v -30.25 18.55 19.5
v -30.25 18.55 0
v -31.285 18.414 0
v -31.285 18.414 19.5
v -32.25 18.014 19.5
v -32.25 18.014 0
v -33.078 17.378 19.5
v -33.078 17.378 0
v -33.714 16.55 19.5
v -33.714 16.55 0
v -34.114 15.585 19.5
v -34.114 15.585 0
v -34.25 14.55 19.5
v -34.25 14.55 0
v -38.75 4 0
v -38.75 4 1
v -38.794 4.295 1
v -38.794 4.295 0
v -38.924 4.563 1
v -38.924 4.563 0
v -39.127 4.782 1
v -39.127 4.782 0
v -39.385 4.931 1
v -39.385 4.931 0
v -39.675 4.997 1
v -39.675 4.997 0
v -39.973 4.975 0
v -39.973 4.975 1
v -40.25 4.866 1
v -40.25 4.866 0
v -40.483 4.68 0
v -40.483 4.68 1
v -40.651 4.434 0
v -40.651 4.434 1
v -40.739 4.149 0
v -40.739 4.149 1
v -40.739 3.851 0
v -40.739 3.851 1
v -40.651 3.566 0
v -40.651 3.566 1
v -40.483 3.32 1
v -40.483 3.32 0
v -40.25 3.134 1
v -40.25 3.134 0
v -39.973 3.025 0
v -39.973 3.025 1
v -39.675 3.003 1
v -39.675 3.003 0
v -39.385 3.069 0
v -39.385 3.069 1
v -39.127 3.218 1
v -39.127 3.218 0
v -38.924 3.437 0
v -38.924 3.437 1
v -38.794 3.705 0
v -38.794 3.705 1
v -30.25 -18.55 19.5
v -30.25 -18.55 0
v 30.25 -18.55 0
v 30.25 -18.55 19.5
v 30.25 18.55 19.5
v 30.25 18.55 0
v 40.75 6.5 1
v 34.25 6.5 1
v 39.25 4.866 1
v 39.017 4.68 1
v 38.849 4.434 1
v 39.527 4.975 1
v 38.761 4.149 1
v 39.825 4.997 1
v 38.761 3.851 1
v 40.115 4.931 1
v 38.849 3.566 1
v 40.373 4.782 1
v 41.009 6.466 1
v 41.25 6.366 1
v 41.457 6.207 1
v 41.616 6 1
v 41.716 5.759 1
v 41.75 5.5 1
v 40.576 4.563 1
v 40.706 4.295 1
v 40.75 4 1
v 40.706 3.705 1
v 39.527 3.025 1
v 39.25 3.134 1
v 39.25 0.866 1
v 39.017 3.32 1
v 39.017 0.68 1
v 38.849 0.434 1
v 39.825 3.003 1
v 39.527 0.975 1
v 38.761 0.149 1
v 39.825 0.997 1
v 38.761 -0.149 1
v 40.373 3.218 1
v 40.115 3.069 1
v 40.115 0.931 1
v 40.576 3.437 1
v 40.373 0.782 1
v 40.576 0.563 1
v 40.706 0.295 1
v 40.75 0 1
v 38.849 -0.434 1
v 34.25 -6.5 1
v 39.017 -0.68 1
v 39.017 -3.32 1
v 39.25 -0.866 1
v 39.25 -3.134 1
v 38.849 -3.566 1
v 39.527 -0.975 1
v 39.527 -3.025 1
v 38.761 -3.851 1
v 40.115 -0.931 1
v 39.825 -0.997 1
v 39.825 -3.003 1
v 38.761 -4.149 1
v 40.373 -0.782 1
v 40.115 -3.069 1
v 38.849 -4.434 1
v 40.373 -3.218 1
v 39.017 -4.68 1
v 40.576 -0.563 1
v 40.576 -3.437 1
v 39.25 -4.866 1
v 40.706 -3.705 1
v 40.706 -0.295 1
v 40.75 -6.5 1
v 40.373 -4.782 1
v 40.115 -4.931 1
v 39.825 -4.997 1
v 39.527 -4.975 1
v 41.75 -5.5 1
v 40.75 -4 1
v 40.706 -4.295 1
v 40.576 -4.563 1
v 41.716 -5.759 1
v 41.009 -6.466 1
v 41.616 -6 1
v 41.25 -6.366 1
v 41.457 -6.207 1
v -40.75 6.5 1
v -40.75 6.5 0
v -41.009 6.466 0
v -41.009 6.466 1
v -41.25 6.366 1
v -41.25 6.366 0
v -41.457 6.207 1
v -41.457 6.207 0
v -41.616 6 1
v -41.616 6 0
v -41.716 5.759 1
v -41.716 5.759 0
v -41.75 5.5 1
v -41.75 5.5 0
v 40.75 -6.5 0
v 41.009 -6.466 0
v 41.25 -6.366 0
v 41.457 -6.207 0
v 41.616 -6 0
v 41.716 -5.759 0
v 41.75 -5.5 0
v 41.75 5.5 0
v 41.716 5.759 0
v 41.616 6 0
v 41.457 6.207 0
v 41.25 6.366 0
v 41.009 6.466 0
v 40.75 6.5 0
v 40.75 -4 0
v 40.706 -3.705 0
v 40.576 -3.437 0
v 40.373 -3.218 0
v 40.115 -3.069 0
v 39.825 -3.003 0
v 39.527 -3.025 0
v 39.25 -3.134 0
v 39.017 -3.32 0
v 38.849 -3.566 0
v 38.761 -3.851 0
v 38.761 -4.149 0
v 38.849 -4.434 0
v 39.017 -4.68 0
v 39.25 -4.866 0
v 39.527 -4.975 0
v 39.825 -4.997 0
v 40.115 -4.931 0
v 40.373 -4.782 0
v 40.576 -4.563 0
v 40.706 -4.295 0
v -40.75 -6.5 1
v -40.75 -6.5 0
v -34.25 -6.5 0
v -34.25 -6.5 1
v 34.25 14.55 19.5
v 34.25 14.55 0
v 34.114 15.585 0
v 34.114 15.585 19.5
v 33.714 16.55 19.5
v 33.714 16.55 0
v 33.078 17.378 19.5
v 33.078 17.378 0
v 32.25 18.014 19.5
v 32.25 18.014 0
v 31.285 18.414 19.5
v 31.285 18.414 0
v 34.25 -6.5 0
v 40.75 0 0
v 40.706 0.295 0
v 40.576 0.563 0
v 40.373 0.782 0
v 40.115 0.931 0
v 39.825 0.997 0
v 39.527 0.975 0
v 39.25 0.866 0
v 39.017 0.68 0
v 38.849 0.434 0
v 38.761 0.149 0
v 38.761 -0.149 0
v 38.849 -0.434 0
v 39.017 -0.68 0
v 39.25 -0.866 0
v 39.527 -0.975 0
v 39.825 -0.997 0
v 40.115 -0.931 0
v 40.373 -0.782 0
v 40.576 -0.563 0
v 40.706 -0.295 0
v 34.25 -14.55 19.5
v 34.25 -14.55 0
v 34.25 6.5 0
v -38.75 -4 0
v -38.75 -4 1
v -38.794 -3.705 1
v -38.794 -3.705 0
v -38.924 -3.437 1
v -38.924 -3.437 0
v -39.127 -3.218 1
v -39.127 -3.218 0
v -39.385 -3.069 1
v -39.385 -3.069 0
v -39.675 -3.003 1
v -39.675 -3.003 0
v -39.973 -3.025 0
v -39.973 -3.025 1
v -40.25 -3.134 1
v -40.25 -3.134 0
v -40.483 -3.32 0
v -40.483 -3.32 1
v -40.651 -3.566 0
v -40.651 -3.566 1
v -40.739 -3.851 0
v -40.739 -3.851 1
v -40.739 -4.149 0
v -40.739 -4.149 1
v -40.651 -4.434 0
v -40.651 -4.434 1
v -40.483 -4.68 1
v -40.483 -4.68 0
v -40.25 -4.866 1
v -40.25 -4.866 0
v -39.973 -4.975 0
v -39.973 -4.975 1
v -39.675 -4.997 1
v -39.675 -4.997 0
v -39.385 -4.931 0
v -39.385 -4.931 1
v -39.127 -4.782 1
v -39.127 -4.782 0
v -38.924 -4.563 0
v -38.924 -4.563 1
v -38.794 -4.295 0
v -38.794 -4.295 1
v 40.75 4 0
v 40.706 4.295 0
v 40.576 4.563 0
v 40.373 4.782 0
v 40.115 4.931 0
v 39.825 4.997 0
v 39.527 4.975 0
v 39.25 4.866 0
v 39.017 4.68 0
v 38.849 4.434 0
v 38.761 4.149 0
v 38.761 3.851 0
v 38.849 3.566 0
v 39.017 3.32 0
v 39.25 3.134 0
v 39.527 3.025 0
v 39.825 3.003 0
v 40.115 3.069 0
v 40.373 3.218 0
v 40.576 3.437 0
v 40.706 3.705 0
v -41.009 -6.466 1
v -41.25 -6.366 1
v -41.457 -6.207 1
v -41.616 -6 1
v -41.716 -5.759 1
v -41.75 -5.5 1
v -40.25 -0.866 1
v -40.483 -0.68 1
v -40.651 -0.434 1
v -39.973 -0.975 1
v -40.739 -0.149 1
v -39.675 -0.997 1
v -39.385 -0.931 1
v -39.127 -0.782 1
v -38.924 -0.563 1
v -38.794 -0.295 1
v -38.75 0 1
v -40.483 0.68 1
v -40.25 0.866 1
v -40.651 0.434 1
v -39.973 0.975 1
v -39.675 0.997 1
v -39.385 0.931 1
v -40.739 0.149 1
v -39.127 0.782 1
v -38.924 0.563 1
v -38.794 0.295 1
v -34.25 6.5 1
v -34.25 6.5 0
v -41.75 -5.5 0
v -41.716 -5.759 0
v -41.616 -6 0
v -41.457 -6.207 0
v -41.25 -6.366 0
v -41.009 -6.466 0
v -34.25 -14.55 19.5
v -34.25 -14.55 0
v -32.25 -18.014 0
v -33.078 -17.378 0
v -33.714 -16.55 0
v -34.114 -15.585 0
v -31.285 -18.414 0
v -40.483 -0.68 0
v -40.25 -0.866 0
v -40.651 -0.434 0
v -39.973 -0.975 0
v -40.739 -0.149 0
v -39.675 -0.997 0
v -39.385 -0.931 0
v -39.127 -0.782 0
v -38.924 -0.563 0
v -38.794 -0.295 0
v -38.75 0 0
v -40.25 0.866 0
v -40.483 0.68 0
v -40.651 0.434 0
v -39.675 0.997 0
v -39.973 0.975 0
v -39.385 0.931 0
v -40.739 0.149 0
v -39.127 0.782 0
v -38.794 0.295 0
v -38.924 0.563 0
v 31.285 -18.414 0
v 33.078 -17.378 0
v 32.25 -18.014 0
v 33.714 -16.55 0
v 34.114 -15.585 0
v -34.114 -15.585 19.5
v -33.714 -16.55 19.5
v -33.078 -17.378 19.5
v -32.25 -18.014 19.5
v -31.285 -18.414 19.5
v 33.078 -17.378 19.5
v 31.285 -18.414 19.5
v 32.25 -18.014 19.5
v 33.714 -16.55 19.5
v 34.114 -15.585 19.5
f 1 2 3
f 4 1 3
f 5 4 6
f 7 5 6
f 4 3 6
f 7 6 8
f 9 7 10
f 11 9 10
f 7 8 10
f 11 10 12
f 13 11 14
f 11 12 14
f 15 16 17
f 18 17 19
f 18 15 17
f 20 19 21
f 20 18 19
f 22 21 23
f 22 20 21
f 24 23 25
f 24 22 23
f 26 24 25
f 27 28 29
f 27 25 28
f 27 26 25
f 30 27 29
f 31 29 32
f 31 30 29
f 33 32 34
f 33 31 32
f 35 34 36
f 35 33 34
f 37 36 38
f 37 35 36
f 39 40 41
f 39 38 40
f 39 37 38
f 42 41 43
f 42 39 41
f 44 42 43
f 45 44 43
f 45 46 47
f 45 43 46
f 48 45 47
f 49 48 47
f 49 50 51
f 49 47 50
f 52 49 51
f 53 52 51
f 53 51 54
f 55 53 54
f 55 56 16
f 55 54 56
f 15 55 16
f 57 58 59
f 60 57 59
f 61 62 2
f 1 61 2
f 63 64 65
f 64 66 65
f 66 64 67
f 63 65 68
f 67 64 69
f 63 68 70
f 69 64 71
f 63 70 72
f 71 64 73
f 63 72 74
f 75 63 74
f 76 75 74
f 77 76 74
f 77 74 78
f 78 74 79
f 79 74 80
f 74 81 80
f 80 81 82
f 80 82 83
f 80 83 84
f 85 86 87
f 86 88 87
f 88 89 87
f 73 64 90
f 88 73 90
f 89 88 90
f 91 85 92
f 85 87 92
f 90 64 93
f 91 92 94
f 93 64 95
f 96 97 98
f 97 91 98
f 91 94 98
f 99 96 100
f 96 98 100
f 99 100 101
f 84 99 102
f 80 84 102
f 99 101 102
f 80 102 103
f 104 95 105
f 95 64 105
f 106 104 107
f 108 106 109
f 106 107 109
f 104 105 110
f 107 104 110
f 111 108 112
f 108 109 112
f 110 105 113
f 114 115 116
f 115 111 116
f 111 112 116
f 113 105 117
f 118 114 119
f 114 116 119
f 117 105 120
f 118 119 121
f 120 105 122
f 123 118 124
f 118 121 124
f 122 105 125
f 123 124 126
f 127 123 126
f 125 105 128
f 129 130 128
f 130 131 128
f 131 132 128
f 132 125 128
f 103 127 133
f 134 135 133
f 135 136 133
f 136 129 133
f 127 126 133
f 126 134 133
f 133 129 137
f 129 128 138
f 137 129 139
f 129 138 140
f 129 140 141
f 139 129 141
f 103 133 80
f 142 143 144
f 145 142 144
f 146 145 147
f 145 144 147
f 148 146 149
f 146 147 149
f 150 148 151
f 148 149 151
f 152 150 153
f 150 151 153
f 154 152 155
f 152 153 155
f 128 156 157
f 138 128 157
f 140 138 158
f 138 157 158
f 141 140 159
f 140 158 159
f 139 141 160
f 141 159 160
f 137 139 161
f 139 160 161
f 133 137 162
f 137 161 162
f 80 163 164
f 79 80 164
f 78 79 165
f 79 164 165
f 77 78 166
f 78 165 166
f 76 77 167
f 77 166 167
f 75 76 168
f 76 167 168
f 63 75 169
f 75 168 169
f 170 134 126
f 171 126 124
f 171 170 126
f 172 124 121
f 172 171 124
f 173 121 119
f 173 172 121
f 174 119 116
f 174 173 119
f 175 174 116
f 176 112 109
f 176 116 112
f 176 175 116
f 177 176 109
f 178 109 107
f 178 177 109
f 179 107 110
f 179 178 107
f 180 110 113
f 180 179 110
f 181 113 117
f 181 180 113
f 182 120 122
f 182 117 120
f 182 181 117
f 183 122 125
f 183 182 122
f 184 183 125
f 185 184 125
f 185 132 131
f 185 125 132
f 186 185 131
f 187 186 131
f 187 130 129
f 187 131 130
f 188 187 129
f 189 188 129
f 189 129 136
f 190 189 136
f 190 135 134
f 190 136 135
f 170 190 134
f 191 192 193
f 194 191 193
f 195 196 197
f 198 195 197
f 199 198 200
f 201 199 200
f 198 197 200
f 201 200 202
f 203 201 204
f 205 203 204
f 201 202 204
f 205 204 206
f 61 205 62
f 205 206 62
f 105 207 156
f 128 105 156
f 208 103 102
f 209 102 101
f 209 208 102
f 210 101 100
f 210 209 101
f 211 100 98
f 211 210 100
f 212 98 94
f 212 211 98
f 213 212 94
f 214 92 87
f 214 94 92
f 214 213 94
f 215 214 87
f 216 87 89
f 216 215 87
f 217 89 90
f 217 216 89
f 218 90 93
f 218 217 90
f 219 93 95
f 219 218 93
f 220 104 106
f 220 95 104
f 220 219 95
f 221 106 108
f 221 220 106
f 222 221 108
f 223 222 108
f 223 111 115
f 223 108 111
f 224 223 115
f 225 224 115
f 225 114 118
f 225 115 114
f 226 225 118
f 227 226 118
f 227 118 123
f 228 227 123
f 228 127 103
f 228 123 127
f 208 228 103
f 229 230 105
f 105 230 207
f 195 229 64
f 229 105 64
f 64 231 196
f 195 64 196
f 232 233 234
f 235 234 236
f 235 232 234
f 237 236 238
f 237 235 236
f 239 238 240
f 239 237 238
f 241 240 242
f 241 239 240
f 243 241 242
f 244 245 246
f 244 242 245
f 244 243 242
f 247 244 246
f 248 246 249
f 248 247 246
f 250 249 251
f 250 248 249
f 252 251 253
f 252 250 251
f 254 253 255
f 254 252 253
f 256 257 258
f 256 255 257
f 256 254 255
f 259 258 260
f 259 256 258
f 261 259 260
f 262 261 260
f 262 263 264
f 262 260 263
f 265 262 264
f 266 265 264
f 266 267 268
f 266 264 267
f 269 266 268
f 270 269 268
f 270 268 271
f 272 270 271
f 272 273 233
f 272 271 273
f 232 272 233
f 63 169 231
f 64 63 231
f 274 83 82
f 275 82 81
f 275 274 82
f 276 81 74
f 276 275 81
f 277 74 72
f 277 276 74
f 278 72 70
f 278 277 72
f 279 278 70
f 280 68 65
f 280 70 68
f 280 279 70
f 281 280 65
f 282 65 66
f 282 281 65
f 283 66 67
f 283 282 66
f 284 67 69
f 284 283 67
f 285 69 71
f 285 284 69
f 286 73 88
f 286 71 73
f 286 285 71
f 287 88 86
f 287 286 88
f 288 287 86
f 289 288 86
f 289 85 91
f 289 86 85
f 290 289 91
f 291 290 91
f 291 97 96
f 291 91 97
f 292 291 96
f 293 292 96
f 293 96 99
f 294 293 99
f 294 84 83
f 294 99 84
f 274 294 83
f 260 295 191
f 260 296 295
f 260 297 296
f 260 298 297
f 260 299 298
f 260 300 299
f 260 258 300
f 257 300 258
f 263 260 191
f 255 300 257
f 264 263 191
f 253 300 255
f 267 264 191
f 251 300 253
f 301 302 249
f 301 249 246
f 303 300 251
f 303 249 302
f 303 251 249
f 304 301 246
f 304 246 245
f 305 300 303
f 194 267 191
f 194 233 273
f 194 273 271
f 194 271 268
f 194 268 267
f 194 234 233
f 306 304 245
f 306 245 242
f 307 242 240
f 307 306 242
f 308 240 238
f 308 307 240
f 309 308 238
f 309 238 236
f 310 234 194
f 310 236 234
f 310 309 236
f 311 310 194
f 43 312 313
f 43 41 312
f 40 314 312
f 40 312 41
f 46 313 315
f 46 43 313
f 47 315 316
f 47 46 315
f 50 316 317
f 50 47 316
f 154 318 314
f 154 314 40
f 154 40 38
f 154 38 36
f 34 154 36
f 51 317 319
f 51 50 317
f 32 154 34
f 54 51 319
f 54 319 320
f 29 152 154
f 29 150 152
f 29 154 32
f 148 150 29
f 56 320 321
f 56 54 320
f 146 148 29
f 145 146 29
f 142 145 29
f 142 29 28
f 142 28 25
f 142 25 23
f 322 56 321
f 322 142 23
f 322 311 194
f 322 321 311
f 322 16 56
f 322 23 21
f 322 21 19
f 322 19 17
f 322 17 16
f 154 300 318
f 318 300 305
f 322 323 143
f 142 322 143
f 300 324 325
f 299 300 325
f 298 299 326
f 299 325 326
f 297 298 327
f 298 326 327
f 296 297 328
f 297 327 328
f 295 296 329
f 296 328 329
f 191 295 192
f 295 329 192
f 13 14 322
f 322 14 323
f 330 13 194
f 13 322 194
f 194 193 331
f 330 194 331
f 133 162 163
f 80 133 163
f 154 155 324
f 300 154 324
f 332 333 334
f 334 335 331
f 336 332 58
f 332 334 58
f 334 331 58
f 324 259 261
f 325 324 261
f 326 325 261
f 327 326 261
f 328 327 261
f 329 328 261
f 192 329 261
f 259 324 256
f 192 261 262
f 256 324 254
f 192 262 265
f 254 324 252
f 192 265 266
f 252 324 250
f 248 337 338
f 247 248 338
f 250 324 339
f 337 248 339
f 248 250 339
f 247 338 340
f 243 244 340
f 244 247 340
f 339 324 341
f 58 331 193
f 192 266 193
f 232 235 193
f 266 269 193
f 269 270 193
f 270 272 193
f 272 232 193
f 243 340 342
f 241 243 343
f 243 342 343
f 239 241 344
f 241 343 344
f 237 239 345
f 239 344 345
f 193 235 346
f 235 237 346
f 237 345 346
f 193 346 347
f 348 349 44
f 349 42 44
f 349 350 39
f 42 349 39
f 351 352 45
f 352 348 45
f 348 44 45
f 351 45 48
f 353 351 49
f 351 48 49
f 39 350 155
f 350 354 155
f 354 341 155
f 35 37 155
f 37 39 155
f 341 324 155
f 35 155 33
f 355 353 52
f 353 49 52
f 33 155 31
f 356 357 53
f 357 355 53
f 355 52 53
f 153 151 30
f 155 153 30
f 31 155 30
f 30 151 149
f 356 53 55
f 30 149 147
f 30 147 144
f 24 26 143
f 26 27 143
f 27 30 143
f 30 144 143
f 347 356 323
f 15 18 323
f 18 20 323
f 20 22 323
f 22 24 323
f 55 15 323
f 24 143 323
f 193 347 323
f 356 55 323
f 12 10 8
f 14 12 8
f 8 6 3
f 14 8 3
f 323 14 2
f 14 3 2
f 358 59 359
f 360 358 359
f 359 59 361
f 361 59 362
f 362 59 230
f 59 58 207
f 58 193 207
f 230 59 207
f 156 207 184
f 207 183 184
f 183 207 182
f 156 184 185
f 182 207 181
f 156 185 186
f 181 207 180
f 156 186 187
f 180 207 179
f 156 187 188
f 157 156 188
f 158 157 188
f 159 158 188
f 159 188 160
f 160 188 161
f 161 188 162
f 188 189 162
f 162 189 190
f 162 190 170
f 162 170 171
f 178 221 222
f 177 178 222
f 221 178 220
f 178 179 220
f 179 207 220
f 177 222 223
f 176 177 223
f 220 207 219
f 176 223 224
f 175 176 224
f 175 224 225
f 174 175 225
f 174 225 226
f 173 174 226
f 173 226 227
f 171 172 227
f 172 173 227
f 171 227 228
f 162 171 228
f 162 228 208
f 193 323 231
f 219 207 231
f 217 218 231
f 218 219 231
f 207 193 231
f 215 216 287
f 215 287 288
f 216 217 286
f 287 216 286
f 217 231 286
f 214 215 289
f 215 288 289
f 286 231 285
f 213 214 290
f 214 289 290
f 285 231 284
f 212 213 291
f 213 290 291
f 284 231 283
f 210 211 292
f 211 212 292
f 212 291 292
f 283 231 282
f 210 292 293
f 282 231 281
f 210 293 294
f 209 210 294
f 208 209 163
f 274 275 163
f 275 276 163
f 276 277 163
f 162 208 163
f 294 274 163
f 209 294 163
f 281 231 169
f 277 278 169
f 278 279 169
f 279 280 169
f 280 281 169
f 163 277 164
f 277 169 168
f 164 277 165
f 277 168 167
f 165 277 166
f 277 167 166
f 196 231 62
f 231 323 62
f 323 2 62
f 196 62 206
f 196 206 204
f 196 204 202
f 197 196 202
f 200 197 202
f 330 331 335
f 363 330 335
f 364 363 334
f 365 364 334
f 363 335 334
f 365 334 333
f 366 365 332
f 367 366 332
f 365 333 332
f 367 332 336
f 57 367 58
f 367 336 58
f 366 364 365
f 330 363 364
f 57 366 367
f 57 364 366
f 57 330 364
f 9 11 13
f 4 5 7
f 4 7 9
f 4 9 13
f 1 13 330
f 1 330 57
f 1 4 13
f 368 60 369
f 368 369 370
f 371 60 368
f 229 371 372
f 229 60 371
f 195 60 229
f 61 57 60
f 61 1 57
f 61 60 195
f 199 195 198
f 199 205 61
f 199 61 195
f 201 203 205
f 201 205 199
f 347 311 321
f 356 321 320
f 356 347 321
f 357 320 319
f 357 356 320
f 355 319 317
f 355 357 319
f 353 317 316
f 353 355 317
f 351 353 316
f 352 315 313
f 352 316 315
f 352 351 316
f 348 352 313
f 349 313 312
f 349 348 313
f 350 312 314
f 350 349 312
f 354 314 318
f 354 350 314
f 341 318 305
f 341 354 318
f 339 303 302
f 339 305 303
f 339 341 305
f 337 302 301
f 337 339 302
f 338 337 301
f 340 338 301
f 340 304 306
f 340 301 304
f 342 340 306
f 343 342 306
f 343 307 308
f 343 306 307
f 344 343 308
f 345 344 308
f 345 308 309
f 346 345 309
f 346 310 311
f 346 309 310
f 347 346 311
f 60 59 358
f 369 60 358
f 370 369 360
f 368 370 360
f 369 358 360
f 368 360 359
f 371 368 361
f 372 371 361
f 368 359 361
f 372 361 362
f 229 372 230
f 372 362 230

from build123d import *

# Parameters (mm, degrees)
F0_R     = 1
F1_DEPTH = 19.5
F2_W     = 7.5
F2_H     = 18.5
F3_DEPTH = 12.5


with BuildPart() as f1:
    # F0 (on Top) → F1 (new body)
    with BuildSketch(Plane.XY):
        with BuildLine():
            Line((30.25, 18.55), (-30.25, 18.55))
            ThreePointArc((-30.25, 18.55), (-33.078427, 17.378427), (-34.25, 14.55))
            Line((-34.25, 14.55), (-34.25, 6.5))
            Line((-34.25, 6.5), (-34.25, -6.5))
            Line((-34.25, -6.5), (-34.25, -14.55))
            ThreePointArc((-34.25, -14.55), (-33.078427, -17.378427), (-30.25, -18.55))
            Line((-30.25, -18.55), (30.25, -18.55))
            ThreePointArc((30.25, -18.55), (33.078427, -17.378427), (34.25, -14.55))
            Line((34.25, -14.55), (34.25, -6.5))
            Line((34.25, -6.5), (34.25, 6.5))
            Line((34.25, 6.5), (34.25, 14.55))
            ThreePointArc((34.25, 14.55), (33.078427, 17.378427), (30.25, 18.55))
        make_face()
        with BuildLine():
            Line((-34.25, -6.5), (-34.25, 6.5))
            Line((-34.25, 6.5), (-40.75, 6.5))
            ThreePointArc((-40.75, 6.5), (-41.457107, 6.207107), (-41.75, 5.5))
            Line((-41.75, 5.5), (-41.75, -5.5))
            ThreePointArc((-41.75, -5.5), (-41.457107, -6.207107), (-40.75, -6.5))
            Line((-40.75, -6.5), (-34.25, -6.5))
        make_face()
        with Locations((-39.75, -4)):
            Circle(F0_R, mode=Mode.SUBTRACT)
        with Locations((-39.75, 0)):
            Circle(F0_R, mode=Mode.SUBTRACT)
        with Locations((-39.75, 4)):
            Circle(F0_R, mode=Mode.SUBTRACT)
        with BuildLine():
            Line((40.75, 6.5), (34.25, 6.5))
            Line((34.25, 6.5), (34.25, -6.5))
            Line((34.25, -6.5), (40.75, -6.5))
            ThreePointArc((40.75, -6.5), (41.457107, -6.207107), (41.75, -5.5))
            Line((41.75, -5.5), (41.75, 5.5))
            ThreePointArc((41.75, 5.5), (41.457107, 6.207107), (40.75, 6.5))
        make_face()
        with Locations((39.75, -4)):
            Circle(F0_R, mode=Mode.SUBTRACT)
        with Locations((39.75, 0)):
            Circle(F0_R, mode=Mode.SUBTRACT)
        with Locations((39.75, 4)):
            Circle(F0_R, mode=Mode.SUBTRACT)
    extrude(amount=F1_DEPTH)

    # F2 (on Front) → F3 (cut, symmetric)
    with BuildSketch(Plane.XZ):
        with Locations((-38, 10.25)):
            Rectangle(F2_W, F2_H)
        with Locations((38, 10.25)):
            Rectangle(F2_W, F2_H)
    extrude(amount=F3_DEPTH, both=True, mode=Mode.SUBTRACT)


solid = f1.part
